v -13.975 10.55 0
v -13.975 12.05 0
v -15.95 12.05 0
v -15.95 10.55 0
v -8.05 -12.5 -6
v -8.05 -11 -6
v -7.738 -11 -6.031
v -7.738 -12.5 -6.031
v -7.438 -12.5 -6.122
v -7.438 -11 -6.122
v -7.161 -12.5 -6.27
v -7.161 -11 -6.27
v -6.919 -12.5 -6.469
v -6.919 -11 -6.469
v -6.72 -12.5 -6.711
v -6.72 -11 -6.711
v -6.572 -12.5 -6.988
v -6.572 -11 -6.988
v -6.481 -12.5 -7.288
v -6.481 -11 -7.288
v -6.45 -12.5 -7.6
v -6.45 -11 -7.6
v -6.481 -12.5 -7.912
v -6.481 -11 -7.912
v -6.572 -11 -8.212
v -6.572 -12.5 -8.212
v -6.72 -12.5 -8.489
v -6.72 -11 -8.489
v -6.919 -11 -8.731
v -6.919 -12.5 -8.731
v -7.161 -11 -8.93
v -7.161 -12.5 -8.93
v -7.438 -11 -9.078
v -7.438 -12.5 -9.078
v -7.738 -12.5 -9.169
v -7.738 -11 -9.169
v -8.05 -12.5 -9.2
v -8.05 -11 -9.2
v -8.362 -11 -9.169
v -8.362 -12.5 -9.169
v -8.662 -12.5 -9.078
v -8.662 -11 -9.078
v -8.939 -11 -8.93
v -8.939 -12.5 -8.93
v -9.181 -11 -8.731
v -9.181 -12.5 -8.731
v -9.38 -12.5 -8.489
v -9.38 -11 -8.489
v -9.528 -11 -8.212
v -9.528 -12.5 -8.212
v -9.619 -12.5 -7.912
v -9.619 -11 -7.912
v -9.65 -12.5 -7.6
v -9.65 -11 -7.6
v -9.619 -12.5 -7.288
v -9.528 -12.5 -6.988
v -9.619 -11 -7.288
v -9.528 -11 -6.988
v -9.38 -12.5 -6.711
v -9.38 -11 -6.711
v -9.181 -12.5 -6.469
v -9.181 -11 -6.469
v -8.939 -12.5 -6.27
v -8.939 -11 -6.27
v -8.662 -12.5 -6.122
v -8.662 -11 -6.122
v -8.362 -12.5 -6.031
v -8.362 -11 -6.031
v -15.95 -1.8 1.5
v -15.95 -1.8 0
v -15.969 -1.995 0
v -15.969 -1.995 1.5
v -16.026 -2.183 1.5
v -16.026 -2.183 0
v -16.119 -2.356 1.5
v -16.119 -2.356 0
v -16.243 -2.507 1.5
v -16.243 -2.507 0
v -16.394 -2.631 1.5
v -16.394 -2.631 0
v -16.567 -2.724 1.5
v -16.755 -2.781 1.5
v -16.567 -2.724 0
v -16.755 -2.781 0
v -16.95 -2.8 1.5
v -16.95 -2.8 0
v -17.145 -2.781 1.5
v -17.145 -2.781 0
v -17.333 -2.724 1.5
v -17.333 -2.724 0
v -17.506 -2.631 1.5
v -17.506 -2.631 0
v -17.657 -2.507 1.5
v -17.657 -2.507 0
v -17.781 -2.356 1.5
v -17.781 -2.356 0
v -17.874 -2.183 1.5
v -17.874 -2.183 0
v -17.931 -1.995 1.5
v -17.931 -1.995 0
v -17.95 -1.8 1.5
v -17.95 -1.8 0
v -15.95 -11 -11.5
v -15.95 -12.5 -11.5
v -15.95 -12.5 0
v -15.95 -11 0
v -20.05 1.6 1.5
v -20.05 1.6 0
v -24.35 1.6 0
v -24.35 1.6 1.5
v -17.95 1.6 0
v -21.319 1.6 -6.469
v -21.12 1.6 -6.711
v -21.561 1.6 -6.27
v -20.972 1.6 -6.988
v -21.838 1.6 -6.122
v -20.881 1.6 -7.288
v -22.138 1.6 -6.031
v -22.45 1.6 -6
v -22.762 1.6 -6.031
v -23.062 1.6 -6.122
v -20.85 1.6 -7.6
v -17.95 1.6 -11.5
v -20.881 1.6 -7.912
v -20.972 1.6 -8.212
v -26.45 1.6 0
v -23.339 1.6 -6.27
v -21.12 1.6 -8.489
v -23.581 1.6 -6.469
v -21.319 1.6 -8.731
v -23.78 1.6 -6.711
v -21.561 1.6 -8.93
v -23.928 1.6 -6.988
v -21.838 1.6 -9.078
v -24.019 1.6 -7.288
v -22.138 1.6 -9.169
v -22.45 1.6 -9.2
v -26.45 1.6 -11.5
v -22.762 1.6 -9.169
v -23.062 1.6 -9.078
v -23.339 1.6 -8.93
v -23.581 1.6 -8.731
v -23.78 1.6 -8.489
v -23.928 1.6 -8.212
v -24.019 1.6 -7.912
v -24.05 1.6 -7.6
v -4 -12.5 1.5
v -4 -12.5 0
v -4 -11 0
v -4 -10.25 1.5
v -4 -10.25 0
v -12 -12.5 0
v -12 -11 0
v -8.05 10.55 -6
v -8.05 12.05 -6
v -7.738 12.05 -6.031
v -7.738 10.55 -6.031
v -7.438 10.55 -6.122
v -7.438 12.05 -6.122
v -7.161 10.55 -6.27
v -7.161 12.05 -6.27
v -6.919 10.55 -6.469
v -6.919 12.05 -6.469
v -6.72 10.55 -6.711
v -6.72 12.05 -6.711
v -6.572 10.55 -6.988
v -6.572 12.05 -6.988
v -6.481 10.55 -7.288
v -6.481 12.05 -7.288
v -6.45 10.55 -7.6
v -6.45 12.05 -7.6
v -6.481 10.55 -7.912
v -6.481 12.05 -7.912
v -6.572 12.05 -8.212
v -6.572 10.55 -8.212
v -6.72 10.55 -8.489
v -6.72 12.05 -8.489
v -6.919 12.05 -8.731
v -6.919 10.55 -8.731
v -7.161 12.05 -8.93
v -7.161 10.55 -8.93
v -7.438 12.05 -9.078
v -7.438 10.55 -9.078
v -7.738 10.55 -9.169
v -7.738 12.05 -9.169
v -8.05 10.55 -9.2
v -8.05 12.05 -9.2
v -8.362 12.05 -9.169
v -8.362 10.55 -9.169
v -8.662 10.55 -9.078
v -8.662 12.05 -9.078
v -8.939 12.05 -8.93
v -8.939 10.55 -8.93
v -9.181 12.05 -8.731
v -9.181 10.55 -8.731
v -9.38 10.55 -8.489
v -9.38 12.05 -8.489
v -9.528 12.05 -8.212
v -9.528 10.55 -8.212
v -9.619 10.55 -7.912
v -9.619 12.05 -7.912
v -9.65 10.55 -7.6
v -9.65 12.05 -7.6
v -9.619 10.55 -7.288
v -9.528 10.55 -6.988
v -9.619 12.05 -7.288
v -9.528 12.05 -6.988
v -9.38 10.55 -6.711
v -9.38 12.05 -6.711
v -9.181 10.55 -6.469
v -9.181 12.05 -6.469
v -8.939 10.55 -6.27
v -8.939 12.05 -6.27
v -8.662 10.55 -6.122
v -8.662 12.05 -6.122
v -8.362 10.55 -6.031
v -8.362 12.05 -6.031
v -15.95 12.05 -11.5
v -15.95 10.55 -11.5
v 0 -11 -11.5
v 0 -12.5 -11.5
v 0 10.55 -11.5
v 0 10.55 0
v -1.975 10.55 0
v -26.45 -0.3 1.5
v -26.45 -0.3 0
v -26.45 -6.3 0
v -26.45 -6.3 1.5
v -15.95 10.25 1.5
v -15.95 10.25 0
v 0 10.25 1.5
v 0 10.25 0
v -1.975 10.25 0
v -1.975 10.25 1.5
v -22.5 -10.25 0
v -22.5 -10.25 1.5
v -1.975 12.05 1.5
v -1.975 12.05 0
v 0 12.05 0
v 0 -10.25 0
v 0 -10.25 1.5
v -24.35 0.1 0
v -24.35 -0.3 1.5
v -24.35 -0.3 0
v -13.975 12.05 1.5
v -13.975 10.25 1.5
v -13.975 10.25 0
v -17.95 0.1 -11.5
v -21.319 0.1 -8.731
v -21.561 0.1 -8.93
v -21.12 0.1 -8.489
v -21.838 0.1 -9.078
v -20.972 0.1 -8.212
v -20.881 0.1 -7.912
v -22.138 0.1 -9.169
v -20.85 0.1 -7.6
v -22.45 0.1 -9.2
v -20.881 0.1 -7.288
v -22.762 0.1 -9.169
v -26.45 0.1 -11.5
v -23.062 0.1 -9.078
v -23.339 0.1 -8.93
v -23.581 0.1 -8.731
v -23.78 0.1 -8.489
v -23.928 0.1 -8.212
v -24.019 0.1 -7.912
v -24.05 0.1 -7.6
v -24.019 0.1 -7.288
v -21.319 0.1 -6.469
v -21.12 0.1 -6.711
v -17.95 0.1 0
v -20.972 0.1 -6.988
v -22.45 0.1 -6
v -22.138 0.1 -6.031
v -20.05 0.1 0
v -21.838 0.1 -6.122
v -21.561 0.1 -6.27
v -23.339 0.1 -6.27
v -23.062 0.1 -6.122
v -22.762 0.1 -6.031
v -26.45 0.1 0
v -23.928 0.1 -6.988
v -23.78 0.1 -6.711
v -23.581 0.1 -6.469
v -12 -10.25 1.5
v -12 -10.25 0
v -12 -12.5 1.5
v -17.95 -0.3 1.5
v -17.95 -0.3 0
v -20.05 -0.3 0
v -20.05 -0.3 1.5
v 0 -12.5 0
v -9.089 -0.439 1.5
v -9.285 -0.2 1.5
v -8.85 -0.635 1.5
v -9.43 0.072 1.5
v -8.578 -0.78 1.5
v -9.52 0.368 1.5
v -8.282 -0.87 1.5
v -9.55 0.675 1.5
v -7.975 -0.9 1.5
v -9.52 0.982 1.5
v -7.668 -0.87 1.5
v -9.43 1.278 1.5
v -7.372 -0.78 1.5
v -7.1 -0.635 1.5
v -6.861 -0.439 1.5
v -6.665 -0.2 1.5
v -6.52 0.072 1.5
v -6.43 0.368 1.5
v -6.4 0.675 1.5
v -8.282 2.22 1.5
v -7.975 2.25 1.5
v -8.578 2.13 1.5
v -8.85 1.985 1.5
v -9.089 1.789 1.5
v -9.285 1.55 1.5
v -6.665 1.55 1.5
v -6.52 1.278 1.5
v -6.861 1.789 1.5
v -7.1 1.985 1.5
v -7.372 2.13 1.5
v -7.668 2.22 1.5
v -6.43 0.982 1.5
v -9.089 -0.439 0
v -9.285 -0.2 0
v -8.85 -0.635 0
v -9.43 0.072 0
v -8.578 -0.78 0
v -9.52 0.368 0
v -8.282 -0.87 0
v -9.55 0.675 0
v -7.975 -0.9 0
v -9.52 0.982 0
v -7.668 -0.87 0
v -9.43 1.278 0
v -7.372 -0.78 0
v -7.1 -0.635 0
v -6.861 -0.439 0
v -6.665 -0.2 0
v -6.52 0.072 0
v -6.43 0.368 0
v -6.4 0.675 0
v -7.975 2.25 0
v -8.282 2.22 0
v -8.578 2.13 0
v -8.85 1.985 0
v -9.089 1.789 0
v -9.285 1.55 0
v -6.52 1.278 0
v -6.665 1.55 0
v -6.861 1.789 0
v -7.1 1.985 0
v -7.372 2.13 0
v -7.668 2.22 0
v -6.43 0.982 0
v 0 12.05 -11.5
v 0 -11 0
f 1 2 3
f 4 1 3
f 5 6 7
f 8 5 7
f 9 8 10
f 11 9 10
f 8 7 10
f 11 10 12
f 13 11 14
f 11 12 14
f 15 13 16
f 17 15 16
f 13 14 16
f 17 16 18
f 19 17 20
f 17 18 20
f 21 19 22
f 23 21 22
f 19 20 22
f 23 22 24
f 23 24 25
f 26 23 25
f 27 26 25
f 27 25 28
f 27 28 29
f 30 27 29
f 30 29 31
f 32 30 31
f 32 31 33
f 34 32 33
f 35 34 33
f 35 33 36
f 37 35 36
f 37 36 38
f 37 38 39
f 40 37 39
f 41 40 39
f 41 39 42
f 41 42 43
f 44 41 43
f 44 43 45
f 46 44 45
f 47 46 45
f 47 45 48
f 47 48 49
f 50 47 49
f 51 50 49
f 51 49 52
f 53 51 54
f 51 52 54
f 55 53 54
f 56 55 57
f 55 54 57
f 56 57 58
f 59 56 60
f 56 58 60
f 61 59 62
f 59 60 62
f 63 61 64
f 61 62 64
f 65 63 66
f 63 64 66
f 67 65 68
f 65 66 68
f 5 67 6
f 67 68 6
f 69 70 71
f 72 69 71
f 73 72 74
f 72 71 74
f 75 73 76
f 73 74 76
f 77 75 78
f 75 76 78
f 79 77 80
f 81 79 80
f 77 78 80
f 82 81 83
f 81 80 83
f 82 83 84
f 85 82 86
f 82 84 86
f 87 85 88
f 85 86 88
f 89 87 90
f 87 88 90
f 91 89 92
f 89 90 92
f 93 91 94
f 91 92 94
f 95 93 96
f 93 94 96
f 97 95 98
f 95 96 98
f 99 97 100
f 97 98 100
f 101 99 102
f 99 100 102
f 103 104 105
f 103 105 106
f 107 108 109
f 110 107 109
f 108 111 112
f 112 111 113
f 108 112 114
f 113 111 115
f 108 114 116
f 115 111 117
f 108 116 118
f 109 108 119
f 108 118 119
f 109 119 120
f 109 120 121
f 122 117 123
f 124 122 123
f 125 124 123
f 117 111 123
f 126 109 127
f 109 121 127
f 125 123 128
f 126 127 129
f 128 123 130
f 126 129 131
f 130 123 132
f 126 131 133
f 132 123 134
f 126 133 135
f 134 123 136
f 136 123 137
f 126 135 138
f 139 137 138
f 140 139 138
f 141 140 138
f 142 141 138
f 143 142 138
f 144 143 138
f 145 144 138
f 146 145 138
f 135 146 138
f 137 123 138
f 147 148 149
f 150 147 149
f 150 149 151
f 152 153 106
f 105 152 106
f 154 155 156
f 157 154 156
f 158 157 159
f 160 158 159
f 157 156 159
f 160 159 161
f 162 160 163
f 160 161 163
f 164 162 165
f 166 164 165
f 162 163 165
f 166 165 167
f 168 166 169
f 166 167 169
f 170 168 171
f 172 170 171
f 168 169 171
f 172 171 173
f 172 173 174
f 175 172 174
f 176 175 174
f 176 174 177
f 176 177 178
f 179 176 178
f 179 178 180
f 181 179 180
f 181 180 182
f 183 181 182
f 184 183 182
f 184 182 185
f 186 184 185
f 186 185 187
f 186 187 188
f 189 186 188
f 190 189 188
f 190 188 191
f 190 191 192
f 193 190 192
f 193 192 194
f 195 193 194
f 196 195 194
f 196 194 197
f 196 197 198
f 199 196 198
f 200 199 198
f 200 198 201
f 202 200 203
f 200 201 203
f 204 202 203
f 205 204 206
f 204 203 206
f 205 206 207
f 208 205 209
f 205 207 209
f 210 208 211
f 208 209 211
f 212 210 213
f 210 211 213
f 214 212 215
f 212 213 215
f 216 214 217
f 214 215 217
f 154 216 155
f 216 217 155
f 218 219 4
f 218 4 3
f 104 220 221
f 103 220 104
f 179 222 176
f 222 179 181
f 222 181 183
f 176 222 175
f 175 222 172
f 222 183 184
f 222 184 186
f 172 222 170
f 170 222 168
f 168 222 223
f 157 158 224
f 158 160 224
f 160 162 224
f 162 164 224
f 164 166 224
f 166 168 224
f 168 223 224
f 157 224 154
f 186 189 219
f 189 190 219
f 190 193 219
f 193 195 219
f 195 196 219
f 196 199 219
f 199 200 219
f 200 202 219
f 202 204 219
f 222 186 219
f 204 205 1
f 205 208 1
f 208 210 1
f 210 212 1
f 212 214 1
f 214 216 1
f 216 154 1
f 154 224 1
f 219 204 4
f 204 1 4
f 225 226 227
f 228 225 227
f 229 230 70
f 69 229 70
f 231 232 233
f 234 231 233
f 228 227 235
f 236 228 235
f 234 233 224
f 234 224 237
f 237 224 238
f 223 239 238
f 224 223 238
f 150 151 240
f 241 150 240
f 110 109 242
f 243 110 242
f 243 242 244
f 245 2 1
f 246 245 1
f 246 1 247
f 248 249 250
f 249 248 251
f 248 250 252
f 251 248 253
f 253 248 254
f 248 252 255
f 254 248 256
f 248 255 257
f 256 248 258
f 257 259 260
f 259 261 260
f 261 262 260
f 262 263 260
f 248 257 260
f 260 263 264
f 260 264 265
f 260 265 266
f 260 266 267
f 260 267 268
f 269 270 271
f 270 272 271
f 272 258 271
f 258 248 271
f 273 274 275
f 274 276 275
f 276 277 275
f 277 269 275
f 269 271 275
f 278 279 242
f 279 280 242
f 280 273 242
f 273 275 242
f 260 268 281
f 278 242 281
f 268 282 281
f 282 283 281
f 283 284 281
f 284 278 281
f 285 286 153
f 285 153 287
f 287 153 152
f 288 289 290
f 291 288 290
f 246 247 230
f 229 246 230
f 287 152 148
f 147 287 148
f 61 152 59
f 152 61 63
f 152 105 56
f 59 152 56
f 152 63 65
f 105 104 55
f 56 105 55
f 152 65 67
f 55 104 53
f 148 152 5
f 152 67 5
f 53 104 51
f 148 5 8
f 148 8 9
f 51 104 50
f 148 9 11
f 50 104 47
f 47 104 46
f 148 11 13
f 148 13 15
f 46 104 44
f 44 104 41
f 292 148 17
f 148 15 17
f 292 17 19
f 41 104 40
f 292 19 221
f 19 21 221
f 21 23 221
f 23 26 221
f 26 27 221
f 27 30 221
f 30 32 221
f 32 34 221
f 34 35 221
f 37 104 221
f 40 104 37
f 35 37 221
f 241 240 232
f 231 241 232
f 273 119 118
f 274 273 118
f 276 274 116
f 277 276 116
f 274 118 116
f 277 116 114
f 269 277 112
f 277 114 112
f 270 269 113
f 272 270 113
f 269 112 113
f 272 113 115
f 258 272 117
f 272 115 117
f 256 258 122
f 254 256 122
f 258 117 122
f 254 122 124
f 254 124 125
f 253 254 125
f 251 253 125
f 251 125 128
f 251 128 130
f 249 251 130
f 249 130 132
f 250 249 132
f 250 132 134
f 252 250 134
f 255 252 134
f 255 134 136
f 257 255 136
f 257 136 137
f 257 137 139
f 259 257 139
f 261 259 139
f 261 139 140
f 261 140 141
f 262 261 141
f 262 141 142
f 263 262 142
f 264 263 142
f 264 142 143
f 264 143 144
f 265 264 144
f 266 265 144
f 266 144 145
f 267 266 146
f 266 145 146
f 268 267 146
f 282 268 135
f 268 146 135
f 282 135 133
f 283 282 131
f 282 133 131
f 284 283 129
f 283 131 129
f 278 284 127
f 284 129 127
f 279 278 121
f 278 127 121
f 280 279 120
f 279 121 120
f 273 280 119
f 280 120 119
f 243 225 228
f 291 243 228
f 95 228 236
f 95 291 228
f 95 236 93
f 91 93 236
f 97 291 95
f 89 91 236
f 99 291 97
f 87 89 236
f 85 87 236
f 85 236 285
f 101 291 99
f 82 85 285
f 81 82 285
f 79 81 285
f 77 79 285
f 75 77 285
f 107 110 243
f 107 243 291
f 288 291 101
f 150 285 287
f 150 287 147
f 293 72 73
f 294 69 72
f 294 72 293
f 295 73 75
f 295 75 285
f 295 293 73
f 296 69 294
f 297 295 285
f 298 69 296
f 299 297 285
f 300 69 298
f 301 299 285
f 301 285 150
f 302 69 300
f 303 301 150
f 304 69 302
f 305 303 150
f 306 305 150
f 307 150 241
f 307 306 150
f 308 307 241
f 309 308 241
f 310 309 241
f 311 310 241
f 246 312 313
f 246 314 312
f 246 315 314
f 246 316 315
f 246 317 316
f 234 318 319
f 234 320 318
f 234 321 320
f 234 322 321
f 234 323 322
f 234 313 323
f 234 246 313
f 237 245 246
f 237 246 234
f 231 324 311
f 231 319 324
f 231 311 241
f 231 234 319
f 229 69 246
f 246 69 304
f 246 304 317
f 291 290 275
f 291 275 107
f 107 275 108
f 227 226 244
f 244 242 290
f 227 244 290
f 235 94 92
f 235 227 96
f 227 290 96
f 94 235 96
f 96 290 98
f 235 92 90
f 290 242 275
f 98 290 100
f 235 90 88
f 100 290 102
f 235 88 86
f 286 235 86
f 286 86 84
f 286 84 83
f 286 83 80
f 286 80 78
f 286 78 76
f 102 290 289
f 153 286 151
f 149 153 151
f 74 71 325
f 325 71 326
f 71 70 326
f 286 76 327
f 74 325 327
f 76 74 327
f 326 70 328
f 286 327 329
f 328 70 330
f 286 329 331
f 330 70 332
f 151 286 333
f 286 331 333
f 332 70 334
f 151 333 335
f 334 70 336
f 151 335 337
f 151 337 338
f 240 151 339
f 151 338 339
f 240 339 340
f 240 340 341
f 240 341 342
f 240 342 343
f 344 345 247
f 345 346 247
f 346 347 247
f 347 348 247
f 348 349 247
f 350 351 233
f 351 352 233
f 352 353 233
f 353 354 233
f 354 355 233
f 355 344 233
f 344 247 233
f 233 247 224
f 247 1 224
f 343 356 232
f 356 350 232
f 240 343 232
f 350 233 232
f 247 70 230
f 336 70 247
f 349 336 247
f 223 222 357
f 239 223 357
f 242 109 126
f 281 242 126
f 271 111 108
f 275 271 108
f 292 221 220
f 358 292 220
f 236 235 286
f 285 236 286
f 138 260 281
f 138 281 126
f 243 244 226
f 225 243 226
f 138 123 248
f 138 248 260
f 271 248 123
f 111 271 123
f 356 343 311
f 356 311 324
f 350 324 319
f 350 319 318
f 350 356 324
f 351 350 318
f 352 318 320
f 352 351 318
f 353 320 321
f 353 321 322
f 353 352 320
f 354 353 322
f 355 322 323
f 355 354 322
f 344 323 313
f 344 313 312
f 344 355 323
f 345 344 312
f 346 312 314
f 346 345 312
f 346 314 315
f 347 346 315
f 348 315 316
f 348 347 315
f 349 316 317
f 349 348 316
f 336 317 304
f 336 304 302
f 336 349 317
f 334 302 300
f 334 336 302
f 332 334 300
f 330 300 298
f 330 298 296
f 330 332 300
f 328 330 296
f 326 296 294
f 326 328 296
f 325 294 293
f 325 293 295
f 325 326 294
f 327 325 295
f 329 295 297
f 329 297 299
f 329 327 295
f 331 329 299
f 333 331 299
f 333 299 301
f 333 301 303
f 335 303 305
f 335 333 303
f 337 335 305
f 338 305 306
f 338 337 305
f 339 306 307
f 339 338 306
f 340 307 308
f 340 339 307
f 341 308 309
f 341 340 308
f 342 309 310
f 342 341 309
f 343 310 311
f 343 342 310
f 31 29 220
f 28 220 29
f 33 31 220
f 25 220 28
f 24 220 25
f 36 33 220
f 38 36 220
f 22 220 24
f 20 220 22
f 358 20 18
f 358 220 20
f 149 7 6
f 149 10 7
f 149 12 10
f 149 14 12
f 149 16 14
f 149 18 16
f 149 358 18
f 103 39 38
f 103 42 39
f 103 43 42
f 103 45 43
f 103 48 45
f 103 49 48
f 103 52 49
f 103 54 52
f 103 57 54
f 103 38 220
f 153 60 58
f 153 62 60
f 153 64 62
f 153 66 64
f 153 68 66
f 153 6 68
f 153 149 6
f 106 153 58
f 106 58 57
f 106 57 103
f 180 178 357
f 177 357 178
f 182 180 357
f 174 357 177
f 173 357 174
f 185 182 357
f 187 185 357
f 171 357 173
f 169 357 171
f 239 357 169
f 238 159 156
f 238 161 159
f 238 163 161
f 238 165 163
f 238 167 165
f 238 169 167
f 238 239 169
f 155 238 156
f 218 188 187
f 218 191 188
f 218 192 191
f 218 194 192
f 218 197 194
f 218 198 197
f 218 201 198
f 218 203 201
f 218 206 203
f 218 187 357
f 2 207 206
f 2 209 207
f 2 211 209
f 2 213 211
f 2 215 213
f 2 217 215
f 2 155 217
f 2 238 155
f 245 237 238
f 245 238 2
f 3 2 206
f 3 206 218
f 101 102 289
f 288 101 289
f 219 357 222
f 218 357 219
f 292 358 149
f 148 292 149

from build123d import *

# Parameters (mm, degrees)
SKETCH1_R           = 1.575
BOSS_EXTRUDE1_DEPTH = 1.5
SKETCH2_W           = 15.95
SKETCH2_H           = 1.5
SKETCH2_W_2         = 8.5
BOSS_EXTRUDE2_DEPTH = 11.5
SKETCH3_R           = 1.6
CUT_EXTRUDE1_DEPTH  = 38.875519798


with BuildPart() as part:
    # Sketch1 → Boss-Extrude1 (new body)
    with BuildSketch(Plane.XY):
        with BuildLine():
            Line((0, -10.25), (0, 10.25))
            Line((0, 10.25), (-1.975, 10.25))
            Line((-1.975, 10.25), (-1.975, 12.05))
            Line((-1.975, 12.05), (-13.975, 12.05))
            Line((-13.975, 12.05), (-13.975, 10.25))
            Line((-13.975, 10.25), (-15.95, 10.25))
            Line((-15.95, 10.25), (-15.95, -1.8))
            ThreePointArc((-15.95, -1.8), (-16.95, -2.8), (-17.95, -1.8))
            Line((-17.95, -1.8), (-17.95, -0.3))
            Line((-17.95, -0.3), (-20.05, -0.3))
            Line((-20.05, -0.3), (-20.05, 1.6))
            Line((-20.05, 1.6), (-24.35, 1.6))
            Line((-24.35, 1.6), (-24.35, -0.3))
            Line((-24.35, -0.3), (-26.45, -0.3))
            Line((-26.45, -0.3), (-26.45, -6.3))
            Line((-26.45, -6.3), (-22.5, -10.25))
            Line((-22.5, -10.25), (-12, -10.25))
            Line((-12, -10.25), (-12, -12.5))
            Line((-12, -12.5), (-4, -12.5))
            Line((-4, -12.5), (-4, -10.25))
            Line((-4, -10.25), (0, -10.25))
        make_face()
        with Locations((-7.975, 0.675)):
            Circle(SKETCH1_R, mode=Mode.SUBTRACT)
    extrude(amount=BOSS_EXTRUDE1_DEPTH)

    # Sketch2 → Boss-Extrude2 (add)
    with BuildSketch(Plane(origin=(0, 0, 0), x_dir=(-1, 0, 0), z_dir=(0, 0, -1))):
        with Locations((7.975, 11.3)):
            Rectangle(SKETCH2_W, SKETCH2_H)
        with Locations((7.975, -11.75)):
            Rectangle(SKETCH2_W, SKETCH2_H)
        with Locations((22.2, 0.85)):
            Rectangle(SKETCH2_W_2, SKETCH2_H)
    extrude(amount=BOSS_EXTRUDE2_DEPTH)

    # Sketch3 → Cut-Extrude1 (cut, through all)
    with BuildSketch(Plane(origin=(0, 12.05, 0), x_dir=(1, 0, 0), z_dir=(0, 1, 0))):
        with Locations(Location((-8.05, 7.6, 0), (0, 0, 270))):
            Circle(SKETCH3_R)
        with Locations(Location((-22.45, 7.6, 0), (0, 0, 270))):
            Circle(SKETCH3_R)
    extrude(amount=-CUT_EXTRUDE1_DEPTH, mode=Mode.SUBTRACT)


solid = part.part
